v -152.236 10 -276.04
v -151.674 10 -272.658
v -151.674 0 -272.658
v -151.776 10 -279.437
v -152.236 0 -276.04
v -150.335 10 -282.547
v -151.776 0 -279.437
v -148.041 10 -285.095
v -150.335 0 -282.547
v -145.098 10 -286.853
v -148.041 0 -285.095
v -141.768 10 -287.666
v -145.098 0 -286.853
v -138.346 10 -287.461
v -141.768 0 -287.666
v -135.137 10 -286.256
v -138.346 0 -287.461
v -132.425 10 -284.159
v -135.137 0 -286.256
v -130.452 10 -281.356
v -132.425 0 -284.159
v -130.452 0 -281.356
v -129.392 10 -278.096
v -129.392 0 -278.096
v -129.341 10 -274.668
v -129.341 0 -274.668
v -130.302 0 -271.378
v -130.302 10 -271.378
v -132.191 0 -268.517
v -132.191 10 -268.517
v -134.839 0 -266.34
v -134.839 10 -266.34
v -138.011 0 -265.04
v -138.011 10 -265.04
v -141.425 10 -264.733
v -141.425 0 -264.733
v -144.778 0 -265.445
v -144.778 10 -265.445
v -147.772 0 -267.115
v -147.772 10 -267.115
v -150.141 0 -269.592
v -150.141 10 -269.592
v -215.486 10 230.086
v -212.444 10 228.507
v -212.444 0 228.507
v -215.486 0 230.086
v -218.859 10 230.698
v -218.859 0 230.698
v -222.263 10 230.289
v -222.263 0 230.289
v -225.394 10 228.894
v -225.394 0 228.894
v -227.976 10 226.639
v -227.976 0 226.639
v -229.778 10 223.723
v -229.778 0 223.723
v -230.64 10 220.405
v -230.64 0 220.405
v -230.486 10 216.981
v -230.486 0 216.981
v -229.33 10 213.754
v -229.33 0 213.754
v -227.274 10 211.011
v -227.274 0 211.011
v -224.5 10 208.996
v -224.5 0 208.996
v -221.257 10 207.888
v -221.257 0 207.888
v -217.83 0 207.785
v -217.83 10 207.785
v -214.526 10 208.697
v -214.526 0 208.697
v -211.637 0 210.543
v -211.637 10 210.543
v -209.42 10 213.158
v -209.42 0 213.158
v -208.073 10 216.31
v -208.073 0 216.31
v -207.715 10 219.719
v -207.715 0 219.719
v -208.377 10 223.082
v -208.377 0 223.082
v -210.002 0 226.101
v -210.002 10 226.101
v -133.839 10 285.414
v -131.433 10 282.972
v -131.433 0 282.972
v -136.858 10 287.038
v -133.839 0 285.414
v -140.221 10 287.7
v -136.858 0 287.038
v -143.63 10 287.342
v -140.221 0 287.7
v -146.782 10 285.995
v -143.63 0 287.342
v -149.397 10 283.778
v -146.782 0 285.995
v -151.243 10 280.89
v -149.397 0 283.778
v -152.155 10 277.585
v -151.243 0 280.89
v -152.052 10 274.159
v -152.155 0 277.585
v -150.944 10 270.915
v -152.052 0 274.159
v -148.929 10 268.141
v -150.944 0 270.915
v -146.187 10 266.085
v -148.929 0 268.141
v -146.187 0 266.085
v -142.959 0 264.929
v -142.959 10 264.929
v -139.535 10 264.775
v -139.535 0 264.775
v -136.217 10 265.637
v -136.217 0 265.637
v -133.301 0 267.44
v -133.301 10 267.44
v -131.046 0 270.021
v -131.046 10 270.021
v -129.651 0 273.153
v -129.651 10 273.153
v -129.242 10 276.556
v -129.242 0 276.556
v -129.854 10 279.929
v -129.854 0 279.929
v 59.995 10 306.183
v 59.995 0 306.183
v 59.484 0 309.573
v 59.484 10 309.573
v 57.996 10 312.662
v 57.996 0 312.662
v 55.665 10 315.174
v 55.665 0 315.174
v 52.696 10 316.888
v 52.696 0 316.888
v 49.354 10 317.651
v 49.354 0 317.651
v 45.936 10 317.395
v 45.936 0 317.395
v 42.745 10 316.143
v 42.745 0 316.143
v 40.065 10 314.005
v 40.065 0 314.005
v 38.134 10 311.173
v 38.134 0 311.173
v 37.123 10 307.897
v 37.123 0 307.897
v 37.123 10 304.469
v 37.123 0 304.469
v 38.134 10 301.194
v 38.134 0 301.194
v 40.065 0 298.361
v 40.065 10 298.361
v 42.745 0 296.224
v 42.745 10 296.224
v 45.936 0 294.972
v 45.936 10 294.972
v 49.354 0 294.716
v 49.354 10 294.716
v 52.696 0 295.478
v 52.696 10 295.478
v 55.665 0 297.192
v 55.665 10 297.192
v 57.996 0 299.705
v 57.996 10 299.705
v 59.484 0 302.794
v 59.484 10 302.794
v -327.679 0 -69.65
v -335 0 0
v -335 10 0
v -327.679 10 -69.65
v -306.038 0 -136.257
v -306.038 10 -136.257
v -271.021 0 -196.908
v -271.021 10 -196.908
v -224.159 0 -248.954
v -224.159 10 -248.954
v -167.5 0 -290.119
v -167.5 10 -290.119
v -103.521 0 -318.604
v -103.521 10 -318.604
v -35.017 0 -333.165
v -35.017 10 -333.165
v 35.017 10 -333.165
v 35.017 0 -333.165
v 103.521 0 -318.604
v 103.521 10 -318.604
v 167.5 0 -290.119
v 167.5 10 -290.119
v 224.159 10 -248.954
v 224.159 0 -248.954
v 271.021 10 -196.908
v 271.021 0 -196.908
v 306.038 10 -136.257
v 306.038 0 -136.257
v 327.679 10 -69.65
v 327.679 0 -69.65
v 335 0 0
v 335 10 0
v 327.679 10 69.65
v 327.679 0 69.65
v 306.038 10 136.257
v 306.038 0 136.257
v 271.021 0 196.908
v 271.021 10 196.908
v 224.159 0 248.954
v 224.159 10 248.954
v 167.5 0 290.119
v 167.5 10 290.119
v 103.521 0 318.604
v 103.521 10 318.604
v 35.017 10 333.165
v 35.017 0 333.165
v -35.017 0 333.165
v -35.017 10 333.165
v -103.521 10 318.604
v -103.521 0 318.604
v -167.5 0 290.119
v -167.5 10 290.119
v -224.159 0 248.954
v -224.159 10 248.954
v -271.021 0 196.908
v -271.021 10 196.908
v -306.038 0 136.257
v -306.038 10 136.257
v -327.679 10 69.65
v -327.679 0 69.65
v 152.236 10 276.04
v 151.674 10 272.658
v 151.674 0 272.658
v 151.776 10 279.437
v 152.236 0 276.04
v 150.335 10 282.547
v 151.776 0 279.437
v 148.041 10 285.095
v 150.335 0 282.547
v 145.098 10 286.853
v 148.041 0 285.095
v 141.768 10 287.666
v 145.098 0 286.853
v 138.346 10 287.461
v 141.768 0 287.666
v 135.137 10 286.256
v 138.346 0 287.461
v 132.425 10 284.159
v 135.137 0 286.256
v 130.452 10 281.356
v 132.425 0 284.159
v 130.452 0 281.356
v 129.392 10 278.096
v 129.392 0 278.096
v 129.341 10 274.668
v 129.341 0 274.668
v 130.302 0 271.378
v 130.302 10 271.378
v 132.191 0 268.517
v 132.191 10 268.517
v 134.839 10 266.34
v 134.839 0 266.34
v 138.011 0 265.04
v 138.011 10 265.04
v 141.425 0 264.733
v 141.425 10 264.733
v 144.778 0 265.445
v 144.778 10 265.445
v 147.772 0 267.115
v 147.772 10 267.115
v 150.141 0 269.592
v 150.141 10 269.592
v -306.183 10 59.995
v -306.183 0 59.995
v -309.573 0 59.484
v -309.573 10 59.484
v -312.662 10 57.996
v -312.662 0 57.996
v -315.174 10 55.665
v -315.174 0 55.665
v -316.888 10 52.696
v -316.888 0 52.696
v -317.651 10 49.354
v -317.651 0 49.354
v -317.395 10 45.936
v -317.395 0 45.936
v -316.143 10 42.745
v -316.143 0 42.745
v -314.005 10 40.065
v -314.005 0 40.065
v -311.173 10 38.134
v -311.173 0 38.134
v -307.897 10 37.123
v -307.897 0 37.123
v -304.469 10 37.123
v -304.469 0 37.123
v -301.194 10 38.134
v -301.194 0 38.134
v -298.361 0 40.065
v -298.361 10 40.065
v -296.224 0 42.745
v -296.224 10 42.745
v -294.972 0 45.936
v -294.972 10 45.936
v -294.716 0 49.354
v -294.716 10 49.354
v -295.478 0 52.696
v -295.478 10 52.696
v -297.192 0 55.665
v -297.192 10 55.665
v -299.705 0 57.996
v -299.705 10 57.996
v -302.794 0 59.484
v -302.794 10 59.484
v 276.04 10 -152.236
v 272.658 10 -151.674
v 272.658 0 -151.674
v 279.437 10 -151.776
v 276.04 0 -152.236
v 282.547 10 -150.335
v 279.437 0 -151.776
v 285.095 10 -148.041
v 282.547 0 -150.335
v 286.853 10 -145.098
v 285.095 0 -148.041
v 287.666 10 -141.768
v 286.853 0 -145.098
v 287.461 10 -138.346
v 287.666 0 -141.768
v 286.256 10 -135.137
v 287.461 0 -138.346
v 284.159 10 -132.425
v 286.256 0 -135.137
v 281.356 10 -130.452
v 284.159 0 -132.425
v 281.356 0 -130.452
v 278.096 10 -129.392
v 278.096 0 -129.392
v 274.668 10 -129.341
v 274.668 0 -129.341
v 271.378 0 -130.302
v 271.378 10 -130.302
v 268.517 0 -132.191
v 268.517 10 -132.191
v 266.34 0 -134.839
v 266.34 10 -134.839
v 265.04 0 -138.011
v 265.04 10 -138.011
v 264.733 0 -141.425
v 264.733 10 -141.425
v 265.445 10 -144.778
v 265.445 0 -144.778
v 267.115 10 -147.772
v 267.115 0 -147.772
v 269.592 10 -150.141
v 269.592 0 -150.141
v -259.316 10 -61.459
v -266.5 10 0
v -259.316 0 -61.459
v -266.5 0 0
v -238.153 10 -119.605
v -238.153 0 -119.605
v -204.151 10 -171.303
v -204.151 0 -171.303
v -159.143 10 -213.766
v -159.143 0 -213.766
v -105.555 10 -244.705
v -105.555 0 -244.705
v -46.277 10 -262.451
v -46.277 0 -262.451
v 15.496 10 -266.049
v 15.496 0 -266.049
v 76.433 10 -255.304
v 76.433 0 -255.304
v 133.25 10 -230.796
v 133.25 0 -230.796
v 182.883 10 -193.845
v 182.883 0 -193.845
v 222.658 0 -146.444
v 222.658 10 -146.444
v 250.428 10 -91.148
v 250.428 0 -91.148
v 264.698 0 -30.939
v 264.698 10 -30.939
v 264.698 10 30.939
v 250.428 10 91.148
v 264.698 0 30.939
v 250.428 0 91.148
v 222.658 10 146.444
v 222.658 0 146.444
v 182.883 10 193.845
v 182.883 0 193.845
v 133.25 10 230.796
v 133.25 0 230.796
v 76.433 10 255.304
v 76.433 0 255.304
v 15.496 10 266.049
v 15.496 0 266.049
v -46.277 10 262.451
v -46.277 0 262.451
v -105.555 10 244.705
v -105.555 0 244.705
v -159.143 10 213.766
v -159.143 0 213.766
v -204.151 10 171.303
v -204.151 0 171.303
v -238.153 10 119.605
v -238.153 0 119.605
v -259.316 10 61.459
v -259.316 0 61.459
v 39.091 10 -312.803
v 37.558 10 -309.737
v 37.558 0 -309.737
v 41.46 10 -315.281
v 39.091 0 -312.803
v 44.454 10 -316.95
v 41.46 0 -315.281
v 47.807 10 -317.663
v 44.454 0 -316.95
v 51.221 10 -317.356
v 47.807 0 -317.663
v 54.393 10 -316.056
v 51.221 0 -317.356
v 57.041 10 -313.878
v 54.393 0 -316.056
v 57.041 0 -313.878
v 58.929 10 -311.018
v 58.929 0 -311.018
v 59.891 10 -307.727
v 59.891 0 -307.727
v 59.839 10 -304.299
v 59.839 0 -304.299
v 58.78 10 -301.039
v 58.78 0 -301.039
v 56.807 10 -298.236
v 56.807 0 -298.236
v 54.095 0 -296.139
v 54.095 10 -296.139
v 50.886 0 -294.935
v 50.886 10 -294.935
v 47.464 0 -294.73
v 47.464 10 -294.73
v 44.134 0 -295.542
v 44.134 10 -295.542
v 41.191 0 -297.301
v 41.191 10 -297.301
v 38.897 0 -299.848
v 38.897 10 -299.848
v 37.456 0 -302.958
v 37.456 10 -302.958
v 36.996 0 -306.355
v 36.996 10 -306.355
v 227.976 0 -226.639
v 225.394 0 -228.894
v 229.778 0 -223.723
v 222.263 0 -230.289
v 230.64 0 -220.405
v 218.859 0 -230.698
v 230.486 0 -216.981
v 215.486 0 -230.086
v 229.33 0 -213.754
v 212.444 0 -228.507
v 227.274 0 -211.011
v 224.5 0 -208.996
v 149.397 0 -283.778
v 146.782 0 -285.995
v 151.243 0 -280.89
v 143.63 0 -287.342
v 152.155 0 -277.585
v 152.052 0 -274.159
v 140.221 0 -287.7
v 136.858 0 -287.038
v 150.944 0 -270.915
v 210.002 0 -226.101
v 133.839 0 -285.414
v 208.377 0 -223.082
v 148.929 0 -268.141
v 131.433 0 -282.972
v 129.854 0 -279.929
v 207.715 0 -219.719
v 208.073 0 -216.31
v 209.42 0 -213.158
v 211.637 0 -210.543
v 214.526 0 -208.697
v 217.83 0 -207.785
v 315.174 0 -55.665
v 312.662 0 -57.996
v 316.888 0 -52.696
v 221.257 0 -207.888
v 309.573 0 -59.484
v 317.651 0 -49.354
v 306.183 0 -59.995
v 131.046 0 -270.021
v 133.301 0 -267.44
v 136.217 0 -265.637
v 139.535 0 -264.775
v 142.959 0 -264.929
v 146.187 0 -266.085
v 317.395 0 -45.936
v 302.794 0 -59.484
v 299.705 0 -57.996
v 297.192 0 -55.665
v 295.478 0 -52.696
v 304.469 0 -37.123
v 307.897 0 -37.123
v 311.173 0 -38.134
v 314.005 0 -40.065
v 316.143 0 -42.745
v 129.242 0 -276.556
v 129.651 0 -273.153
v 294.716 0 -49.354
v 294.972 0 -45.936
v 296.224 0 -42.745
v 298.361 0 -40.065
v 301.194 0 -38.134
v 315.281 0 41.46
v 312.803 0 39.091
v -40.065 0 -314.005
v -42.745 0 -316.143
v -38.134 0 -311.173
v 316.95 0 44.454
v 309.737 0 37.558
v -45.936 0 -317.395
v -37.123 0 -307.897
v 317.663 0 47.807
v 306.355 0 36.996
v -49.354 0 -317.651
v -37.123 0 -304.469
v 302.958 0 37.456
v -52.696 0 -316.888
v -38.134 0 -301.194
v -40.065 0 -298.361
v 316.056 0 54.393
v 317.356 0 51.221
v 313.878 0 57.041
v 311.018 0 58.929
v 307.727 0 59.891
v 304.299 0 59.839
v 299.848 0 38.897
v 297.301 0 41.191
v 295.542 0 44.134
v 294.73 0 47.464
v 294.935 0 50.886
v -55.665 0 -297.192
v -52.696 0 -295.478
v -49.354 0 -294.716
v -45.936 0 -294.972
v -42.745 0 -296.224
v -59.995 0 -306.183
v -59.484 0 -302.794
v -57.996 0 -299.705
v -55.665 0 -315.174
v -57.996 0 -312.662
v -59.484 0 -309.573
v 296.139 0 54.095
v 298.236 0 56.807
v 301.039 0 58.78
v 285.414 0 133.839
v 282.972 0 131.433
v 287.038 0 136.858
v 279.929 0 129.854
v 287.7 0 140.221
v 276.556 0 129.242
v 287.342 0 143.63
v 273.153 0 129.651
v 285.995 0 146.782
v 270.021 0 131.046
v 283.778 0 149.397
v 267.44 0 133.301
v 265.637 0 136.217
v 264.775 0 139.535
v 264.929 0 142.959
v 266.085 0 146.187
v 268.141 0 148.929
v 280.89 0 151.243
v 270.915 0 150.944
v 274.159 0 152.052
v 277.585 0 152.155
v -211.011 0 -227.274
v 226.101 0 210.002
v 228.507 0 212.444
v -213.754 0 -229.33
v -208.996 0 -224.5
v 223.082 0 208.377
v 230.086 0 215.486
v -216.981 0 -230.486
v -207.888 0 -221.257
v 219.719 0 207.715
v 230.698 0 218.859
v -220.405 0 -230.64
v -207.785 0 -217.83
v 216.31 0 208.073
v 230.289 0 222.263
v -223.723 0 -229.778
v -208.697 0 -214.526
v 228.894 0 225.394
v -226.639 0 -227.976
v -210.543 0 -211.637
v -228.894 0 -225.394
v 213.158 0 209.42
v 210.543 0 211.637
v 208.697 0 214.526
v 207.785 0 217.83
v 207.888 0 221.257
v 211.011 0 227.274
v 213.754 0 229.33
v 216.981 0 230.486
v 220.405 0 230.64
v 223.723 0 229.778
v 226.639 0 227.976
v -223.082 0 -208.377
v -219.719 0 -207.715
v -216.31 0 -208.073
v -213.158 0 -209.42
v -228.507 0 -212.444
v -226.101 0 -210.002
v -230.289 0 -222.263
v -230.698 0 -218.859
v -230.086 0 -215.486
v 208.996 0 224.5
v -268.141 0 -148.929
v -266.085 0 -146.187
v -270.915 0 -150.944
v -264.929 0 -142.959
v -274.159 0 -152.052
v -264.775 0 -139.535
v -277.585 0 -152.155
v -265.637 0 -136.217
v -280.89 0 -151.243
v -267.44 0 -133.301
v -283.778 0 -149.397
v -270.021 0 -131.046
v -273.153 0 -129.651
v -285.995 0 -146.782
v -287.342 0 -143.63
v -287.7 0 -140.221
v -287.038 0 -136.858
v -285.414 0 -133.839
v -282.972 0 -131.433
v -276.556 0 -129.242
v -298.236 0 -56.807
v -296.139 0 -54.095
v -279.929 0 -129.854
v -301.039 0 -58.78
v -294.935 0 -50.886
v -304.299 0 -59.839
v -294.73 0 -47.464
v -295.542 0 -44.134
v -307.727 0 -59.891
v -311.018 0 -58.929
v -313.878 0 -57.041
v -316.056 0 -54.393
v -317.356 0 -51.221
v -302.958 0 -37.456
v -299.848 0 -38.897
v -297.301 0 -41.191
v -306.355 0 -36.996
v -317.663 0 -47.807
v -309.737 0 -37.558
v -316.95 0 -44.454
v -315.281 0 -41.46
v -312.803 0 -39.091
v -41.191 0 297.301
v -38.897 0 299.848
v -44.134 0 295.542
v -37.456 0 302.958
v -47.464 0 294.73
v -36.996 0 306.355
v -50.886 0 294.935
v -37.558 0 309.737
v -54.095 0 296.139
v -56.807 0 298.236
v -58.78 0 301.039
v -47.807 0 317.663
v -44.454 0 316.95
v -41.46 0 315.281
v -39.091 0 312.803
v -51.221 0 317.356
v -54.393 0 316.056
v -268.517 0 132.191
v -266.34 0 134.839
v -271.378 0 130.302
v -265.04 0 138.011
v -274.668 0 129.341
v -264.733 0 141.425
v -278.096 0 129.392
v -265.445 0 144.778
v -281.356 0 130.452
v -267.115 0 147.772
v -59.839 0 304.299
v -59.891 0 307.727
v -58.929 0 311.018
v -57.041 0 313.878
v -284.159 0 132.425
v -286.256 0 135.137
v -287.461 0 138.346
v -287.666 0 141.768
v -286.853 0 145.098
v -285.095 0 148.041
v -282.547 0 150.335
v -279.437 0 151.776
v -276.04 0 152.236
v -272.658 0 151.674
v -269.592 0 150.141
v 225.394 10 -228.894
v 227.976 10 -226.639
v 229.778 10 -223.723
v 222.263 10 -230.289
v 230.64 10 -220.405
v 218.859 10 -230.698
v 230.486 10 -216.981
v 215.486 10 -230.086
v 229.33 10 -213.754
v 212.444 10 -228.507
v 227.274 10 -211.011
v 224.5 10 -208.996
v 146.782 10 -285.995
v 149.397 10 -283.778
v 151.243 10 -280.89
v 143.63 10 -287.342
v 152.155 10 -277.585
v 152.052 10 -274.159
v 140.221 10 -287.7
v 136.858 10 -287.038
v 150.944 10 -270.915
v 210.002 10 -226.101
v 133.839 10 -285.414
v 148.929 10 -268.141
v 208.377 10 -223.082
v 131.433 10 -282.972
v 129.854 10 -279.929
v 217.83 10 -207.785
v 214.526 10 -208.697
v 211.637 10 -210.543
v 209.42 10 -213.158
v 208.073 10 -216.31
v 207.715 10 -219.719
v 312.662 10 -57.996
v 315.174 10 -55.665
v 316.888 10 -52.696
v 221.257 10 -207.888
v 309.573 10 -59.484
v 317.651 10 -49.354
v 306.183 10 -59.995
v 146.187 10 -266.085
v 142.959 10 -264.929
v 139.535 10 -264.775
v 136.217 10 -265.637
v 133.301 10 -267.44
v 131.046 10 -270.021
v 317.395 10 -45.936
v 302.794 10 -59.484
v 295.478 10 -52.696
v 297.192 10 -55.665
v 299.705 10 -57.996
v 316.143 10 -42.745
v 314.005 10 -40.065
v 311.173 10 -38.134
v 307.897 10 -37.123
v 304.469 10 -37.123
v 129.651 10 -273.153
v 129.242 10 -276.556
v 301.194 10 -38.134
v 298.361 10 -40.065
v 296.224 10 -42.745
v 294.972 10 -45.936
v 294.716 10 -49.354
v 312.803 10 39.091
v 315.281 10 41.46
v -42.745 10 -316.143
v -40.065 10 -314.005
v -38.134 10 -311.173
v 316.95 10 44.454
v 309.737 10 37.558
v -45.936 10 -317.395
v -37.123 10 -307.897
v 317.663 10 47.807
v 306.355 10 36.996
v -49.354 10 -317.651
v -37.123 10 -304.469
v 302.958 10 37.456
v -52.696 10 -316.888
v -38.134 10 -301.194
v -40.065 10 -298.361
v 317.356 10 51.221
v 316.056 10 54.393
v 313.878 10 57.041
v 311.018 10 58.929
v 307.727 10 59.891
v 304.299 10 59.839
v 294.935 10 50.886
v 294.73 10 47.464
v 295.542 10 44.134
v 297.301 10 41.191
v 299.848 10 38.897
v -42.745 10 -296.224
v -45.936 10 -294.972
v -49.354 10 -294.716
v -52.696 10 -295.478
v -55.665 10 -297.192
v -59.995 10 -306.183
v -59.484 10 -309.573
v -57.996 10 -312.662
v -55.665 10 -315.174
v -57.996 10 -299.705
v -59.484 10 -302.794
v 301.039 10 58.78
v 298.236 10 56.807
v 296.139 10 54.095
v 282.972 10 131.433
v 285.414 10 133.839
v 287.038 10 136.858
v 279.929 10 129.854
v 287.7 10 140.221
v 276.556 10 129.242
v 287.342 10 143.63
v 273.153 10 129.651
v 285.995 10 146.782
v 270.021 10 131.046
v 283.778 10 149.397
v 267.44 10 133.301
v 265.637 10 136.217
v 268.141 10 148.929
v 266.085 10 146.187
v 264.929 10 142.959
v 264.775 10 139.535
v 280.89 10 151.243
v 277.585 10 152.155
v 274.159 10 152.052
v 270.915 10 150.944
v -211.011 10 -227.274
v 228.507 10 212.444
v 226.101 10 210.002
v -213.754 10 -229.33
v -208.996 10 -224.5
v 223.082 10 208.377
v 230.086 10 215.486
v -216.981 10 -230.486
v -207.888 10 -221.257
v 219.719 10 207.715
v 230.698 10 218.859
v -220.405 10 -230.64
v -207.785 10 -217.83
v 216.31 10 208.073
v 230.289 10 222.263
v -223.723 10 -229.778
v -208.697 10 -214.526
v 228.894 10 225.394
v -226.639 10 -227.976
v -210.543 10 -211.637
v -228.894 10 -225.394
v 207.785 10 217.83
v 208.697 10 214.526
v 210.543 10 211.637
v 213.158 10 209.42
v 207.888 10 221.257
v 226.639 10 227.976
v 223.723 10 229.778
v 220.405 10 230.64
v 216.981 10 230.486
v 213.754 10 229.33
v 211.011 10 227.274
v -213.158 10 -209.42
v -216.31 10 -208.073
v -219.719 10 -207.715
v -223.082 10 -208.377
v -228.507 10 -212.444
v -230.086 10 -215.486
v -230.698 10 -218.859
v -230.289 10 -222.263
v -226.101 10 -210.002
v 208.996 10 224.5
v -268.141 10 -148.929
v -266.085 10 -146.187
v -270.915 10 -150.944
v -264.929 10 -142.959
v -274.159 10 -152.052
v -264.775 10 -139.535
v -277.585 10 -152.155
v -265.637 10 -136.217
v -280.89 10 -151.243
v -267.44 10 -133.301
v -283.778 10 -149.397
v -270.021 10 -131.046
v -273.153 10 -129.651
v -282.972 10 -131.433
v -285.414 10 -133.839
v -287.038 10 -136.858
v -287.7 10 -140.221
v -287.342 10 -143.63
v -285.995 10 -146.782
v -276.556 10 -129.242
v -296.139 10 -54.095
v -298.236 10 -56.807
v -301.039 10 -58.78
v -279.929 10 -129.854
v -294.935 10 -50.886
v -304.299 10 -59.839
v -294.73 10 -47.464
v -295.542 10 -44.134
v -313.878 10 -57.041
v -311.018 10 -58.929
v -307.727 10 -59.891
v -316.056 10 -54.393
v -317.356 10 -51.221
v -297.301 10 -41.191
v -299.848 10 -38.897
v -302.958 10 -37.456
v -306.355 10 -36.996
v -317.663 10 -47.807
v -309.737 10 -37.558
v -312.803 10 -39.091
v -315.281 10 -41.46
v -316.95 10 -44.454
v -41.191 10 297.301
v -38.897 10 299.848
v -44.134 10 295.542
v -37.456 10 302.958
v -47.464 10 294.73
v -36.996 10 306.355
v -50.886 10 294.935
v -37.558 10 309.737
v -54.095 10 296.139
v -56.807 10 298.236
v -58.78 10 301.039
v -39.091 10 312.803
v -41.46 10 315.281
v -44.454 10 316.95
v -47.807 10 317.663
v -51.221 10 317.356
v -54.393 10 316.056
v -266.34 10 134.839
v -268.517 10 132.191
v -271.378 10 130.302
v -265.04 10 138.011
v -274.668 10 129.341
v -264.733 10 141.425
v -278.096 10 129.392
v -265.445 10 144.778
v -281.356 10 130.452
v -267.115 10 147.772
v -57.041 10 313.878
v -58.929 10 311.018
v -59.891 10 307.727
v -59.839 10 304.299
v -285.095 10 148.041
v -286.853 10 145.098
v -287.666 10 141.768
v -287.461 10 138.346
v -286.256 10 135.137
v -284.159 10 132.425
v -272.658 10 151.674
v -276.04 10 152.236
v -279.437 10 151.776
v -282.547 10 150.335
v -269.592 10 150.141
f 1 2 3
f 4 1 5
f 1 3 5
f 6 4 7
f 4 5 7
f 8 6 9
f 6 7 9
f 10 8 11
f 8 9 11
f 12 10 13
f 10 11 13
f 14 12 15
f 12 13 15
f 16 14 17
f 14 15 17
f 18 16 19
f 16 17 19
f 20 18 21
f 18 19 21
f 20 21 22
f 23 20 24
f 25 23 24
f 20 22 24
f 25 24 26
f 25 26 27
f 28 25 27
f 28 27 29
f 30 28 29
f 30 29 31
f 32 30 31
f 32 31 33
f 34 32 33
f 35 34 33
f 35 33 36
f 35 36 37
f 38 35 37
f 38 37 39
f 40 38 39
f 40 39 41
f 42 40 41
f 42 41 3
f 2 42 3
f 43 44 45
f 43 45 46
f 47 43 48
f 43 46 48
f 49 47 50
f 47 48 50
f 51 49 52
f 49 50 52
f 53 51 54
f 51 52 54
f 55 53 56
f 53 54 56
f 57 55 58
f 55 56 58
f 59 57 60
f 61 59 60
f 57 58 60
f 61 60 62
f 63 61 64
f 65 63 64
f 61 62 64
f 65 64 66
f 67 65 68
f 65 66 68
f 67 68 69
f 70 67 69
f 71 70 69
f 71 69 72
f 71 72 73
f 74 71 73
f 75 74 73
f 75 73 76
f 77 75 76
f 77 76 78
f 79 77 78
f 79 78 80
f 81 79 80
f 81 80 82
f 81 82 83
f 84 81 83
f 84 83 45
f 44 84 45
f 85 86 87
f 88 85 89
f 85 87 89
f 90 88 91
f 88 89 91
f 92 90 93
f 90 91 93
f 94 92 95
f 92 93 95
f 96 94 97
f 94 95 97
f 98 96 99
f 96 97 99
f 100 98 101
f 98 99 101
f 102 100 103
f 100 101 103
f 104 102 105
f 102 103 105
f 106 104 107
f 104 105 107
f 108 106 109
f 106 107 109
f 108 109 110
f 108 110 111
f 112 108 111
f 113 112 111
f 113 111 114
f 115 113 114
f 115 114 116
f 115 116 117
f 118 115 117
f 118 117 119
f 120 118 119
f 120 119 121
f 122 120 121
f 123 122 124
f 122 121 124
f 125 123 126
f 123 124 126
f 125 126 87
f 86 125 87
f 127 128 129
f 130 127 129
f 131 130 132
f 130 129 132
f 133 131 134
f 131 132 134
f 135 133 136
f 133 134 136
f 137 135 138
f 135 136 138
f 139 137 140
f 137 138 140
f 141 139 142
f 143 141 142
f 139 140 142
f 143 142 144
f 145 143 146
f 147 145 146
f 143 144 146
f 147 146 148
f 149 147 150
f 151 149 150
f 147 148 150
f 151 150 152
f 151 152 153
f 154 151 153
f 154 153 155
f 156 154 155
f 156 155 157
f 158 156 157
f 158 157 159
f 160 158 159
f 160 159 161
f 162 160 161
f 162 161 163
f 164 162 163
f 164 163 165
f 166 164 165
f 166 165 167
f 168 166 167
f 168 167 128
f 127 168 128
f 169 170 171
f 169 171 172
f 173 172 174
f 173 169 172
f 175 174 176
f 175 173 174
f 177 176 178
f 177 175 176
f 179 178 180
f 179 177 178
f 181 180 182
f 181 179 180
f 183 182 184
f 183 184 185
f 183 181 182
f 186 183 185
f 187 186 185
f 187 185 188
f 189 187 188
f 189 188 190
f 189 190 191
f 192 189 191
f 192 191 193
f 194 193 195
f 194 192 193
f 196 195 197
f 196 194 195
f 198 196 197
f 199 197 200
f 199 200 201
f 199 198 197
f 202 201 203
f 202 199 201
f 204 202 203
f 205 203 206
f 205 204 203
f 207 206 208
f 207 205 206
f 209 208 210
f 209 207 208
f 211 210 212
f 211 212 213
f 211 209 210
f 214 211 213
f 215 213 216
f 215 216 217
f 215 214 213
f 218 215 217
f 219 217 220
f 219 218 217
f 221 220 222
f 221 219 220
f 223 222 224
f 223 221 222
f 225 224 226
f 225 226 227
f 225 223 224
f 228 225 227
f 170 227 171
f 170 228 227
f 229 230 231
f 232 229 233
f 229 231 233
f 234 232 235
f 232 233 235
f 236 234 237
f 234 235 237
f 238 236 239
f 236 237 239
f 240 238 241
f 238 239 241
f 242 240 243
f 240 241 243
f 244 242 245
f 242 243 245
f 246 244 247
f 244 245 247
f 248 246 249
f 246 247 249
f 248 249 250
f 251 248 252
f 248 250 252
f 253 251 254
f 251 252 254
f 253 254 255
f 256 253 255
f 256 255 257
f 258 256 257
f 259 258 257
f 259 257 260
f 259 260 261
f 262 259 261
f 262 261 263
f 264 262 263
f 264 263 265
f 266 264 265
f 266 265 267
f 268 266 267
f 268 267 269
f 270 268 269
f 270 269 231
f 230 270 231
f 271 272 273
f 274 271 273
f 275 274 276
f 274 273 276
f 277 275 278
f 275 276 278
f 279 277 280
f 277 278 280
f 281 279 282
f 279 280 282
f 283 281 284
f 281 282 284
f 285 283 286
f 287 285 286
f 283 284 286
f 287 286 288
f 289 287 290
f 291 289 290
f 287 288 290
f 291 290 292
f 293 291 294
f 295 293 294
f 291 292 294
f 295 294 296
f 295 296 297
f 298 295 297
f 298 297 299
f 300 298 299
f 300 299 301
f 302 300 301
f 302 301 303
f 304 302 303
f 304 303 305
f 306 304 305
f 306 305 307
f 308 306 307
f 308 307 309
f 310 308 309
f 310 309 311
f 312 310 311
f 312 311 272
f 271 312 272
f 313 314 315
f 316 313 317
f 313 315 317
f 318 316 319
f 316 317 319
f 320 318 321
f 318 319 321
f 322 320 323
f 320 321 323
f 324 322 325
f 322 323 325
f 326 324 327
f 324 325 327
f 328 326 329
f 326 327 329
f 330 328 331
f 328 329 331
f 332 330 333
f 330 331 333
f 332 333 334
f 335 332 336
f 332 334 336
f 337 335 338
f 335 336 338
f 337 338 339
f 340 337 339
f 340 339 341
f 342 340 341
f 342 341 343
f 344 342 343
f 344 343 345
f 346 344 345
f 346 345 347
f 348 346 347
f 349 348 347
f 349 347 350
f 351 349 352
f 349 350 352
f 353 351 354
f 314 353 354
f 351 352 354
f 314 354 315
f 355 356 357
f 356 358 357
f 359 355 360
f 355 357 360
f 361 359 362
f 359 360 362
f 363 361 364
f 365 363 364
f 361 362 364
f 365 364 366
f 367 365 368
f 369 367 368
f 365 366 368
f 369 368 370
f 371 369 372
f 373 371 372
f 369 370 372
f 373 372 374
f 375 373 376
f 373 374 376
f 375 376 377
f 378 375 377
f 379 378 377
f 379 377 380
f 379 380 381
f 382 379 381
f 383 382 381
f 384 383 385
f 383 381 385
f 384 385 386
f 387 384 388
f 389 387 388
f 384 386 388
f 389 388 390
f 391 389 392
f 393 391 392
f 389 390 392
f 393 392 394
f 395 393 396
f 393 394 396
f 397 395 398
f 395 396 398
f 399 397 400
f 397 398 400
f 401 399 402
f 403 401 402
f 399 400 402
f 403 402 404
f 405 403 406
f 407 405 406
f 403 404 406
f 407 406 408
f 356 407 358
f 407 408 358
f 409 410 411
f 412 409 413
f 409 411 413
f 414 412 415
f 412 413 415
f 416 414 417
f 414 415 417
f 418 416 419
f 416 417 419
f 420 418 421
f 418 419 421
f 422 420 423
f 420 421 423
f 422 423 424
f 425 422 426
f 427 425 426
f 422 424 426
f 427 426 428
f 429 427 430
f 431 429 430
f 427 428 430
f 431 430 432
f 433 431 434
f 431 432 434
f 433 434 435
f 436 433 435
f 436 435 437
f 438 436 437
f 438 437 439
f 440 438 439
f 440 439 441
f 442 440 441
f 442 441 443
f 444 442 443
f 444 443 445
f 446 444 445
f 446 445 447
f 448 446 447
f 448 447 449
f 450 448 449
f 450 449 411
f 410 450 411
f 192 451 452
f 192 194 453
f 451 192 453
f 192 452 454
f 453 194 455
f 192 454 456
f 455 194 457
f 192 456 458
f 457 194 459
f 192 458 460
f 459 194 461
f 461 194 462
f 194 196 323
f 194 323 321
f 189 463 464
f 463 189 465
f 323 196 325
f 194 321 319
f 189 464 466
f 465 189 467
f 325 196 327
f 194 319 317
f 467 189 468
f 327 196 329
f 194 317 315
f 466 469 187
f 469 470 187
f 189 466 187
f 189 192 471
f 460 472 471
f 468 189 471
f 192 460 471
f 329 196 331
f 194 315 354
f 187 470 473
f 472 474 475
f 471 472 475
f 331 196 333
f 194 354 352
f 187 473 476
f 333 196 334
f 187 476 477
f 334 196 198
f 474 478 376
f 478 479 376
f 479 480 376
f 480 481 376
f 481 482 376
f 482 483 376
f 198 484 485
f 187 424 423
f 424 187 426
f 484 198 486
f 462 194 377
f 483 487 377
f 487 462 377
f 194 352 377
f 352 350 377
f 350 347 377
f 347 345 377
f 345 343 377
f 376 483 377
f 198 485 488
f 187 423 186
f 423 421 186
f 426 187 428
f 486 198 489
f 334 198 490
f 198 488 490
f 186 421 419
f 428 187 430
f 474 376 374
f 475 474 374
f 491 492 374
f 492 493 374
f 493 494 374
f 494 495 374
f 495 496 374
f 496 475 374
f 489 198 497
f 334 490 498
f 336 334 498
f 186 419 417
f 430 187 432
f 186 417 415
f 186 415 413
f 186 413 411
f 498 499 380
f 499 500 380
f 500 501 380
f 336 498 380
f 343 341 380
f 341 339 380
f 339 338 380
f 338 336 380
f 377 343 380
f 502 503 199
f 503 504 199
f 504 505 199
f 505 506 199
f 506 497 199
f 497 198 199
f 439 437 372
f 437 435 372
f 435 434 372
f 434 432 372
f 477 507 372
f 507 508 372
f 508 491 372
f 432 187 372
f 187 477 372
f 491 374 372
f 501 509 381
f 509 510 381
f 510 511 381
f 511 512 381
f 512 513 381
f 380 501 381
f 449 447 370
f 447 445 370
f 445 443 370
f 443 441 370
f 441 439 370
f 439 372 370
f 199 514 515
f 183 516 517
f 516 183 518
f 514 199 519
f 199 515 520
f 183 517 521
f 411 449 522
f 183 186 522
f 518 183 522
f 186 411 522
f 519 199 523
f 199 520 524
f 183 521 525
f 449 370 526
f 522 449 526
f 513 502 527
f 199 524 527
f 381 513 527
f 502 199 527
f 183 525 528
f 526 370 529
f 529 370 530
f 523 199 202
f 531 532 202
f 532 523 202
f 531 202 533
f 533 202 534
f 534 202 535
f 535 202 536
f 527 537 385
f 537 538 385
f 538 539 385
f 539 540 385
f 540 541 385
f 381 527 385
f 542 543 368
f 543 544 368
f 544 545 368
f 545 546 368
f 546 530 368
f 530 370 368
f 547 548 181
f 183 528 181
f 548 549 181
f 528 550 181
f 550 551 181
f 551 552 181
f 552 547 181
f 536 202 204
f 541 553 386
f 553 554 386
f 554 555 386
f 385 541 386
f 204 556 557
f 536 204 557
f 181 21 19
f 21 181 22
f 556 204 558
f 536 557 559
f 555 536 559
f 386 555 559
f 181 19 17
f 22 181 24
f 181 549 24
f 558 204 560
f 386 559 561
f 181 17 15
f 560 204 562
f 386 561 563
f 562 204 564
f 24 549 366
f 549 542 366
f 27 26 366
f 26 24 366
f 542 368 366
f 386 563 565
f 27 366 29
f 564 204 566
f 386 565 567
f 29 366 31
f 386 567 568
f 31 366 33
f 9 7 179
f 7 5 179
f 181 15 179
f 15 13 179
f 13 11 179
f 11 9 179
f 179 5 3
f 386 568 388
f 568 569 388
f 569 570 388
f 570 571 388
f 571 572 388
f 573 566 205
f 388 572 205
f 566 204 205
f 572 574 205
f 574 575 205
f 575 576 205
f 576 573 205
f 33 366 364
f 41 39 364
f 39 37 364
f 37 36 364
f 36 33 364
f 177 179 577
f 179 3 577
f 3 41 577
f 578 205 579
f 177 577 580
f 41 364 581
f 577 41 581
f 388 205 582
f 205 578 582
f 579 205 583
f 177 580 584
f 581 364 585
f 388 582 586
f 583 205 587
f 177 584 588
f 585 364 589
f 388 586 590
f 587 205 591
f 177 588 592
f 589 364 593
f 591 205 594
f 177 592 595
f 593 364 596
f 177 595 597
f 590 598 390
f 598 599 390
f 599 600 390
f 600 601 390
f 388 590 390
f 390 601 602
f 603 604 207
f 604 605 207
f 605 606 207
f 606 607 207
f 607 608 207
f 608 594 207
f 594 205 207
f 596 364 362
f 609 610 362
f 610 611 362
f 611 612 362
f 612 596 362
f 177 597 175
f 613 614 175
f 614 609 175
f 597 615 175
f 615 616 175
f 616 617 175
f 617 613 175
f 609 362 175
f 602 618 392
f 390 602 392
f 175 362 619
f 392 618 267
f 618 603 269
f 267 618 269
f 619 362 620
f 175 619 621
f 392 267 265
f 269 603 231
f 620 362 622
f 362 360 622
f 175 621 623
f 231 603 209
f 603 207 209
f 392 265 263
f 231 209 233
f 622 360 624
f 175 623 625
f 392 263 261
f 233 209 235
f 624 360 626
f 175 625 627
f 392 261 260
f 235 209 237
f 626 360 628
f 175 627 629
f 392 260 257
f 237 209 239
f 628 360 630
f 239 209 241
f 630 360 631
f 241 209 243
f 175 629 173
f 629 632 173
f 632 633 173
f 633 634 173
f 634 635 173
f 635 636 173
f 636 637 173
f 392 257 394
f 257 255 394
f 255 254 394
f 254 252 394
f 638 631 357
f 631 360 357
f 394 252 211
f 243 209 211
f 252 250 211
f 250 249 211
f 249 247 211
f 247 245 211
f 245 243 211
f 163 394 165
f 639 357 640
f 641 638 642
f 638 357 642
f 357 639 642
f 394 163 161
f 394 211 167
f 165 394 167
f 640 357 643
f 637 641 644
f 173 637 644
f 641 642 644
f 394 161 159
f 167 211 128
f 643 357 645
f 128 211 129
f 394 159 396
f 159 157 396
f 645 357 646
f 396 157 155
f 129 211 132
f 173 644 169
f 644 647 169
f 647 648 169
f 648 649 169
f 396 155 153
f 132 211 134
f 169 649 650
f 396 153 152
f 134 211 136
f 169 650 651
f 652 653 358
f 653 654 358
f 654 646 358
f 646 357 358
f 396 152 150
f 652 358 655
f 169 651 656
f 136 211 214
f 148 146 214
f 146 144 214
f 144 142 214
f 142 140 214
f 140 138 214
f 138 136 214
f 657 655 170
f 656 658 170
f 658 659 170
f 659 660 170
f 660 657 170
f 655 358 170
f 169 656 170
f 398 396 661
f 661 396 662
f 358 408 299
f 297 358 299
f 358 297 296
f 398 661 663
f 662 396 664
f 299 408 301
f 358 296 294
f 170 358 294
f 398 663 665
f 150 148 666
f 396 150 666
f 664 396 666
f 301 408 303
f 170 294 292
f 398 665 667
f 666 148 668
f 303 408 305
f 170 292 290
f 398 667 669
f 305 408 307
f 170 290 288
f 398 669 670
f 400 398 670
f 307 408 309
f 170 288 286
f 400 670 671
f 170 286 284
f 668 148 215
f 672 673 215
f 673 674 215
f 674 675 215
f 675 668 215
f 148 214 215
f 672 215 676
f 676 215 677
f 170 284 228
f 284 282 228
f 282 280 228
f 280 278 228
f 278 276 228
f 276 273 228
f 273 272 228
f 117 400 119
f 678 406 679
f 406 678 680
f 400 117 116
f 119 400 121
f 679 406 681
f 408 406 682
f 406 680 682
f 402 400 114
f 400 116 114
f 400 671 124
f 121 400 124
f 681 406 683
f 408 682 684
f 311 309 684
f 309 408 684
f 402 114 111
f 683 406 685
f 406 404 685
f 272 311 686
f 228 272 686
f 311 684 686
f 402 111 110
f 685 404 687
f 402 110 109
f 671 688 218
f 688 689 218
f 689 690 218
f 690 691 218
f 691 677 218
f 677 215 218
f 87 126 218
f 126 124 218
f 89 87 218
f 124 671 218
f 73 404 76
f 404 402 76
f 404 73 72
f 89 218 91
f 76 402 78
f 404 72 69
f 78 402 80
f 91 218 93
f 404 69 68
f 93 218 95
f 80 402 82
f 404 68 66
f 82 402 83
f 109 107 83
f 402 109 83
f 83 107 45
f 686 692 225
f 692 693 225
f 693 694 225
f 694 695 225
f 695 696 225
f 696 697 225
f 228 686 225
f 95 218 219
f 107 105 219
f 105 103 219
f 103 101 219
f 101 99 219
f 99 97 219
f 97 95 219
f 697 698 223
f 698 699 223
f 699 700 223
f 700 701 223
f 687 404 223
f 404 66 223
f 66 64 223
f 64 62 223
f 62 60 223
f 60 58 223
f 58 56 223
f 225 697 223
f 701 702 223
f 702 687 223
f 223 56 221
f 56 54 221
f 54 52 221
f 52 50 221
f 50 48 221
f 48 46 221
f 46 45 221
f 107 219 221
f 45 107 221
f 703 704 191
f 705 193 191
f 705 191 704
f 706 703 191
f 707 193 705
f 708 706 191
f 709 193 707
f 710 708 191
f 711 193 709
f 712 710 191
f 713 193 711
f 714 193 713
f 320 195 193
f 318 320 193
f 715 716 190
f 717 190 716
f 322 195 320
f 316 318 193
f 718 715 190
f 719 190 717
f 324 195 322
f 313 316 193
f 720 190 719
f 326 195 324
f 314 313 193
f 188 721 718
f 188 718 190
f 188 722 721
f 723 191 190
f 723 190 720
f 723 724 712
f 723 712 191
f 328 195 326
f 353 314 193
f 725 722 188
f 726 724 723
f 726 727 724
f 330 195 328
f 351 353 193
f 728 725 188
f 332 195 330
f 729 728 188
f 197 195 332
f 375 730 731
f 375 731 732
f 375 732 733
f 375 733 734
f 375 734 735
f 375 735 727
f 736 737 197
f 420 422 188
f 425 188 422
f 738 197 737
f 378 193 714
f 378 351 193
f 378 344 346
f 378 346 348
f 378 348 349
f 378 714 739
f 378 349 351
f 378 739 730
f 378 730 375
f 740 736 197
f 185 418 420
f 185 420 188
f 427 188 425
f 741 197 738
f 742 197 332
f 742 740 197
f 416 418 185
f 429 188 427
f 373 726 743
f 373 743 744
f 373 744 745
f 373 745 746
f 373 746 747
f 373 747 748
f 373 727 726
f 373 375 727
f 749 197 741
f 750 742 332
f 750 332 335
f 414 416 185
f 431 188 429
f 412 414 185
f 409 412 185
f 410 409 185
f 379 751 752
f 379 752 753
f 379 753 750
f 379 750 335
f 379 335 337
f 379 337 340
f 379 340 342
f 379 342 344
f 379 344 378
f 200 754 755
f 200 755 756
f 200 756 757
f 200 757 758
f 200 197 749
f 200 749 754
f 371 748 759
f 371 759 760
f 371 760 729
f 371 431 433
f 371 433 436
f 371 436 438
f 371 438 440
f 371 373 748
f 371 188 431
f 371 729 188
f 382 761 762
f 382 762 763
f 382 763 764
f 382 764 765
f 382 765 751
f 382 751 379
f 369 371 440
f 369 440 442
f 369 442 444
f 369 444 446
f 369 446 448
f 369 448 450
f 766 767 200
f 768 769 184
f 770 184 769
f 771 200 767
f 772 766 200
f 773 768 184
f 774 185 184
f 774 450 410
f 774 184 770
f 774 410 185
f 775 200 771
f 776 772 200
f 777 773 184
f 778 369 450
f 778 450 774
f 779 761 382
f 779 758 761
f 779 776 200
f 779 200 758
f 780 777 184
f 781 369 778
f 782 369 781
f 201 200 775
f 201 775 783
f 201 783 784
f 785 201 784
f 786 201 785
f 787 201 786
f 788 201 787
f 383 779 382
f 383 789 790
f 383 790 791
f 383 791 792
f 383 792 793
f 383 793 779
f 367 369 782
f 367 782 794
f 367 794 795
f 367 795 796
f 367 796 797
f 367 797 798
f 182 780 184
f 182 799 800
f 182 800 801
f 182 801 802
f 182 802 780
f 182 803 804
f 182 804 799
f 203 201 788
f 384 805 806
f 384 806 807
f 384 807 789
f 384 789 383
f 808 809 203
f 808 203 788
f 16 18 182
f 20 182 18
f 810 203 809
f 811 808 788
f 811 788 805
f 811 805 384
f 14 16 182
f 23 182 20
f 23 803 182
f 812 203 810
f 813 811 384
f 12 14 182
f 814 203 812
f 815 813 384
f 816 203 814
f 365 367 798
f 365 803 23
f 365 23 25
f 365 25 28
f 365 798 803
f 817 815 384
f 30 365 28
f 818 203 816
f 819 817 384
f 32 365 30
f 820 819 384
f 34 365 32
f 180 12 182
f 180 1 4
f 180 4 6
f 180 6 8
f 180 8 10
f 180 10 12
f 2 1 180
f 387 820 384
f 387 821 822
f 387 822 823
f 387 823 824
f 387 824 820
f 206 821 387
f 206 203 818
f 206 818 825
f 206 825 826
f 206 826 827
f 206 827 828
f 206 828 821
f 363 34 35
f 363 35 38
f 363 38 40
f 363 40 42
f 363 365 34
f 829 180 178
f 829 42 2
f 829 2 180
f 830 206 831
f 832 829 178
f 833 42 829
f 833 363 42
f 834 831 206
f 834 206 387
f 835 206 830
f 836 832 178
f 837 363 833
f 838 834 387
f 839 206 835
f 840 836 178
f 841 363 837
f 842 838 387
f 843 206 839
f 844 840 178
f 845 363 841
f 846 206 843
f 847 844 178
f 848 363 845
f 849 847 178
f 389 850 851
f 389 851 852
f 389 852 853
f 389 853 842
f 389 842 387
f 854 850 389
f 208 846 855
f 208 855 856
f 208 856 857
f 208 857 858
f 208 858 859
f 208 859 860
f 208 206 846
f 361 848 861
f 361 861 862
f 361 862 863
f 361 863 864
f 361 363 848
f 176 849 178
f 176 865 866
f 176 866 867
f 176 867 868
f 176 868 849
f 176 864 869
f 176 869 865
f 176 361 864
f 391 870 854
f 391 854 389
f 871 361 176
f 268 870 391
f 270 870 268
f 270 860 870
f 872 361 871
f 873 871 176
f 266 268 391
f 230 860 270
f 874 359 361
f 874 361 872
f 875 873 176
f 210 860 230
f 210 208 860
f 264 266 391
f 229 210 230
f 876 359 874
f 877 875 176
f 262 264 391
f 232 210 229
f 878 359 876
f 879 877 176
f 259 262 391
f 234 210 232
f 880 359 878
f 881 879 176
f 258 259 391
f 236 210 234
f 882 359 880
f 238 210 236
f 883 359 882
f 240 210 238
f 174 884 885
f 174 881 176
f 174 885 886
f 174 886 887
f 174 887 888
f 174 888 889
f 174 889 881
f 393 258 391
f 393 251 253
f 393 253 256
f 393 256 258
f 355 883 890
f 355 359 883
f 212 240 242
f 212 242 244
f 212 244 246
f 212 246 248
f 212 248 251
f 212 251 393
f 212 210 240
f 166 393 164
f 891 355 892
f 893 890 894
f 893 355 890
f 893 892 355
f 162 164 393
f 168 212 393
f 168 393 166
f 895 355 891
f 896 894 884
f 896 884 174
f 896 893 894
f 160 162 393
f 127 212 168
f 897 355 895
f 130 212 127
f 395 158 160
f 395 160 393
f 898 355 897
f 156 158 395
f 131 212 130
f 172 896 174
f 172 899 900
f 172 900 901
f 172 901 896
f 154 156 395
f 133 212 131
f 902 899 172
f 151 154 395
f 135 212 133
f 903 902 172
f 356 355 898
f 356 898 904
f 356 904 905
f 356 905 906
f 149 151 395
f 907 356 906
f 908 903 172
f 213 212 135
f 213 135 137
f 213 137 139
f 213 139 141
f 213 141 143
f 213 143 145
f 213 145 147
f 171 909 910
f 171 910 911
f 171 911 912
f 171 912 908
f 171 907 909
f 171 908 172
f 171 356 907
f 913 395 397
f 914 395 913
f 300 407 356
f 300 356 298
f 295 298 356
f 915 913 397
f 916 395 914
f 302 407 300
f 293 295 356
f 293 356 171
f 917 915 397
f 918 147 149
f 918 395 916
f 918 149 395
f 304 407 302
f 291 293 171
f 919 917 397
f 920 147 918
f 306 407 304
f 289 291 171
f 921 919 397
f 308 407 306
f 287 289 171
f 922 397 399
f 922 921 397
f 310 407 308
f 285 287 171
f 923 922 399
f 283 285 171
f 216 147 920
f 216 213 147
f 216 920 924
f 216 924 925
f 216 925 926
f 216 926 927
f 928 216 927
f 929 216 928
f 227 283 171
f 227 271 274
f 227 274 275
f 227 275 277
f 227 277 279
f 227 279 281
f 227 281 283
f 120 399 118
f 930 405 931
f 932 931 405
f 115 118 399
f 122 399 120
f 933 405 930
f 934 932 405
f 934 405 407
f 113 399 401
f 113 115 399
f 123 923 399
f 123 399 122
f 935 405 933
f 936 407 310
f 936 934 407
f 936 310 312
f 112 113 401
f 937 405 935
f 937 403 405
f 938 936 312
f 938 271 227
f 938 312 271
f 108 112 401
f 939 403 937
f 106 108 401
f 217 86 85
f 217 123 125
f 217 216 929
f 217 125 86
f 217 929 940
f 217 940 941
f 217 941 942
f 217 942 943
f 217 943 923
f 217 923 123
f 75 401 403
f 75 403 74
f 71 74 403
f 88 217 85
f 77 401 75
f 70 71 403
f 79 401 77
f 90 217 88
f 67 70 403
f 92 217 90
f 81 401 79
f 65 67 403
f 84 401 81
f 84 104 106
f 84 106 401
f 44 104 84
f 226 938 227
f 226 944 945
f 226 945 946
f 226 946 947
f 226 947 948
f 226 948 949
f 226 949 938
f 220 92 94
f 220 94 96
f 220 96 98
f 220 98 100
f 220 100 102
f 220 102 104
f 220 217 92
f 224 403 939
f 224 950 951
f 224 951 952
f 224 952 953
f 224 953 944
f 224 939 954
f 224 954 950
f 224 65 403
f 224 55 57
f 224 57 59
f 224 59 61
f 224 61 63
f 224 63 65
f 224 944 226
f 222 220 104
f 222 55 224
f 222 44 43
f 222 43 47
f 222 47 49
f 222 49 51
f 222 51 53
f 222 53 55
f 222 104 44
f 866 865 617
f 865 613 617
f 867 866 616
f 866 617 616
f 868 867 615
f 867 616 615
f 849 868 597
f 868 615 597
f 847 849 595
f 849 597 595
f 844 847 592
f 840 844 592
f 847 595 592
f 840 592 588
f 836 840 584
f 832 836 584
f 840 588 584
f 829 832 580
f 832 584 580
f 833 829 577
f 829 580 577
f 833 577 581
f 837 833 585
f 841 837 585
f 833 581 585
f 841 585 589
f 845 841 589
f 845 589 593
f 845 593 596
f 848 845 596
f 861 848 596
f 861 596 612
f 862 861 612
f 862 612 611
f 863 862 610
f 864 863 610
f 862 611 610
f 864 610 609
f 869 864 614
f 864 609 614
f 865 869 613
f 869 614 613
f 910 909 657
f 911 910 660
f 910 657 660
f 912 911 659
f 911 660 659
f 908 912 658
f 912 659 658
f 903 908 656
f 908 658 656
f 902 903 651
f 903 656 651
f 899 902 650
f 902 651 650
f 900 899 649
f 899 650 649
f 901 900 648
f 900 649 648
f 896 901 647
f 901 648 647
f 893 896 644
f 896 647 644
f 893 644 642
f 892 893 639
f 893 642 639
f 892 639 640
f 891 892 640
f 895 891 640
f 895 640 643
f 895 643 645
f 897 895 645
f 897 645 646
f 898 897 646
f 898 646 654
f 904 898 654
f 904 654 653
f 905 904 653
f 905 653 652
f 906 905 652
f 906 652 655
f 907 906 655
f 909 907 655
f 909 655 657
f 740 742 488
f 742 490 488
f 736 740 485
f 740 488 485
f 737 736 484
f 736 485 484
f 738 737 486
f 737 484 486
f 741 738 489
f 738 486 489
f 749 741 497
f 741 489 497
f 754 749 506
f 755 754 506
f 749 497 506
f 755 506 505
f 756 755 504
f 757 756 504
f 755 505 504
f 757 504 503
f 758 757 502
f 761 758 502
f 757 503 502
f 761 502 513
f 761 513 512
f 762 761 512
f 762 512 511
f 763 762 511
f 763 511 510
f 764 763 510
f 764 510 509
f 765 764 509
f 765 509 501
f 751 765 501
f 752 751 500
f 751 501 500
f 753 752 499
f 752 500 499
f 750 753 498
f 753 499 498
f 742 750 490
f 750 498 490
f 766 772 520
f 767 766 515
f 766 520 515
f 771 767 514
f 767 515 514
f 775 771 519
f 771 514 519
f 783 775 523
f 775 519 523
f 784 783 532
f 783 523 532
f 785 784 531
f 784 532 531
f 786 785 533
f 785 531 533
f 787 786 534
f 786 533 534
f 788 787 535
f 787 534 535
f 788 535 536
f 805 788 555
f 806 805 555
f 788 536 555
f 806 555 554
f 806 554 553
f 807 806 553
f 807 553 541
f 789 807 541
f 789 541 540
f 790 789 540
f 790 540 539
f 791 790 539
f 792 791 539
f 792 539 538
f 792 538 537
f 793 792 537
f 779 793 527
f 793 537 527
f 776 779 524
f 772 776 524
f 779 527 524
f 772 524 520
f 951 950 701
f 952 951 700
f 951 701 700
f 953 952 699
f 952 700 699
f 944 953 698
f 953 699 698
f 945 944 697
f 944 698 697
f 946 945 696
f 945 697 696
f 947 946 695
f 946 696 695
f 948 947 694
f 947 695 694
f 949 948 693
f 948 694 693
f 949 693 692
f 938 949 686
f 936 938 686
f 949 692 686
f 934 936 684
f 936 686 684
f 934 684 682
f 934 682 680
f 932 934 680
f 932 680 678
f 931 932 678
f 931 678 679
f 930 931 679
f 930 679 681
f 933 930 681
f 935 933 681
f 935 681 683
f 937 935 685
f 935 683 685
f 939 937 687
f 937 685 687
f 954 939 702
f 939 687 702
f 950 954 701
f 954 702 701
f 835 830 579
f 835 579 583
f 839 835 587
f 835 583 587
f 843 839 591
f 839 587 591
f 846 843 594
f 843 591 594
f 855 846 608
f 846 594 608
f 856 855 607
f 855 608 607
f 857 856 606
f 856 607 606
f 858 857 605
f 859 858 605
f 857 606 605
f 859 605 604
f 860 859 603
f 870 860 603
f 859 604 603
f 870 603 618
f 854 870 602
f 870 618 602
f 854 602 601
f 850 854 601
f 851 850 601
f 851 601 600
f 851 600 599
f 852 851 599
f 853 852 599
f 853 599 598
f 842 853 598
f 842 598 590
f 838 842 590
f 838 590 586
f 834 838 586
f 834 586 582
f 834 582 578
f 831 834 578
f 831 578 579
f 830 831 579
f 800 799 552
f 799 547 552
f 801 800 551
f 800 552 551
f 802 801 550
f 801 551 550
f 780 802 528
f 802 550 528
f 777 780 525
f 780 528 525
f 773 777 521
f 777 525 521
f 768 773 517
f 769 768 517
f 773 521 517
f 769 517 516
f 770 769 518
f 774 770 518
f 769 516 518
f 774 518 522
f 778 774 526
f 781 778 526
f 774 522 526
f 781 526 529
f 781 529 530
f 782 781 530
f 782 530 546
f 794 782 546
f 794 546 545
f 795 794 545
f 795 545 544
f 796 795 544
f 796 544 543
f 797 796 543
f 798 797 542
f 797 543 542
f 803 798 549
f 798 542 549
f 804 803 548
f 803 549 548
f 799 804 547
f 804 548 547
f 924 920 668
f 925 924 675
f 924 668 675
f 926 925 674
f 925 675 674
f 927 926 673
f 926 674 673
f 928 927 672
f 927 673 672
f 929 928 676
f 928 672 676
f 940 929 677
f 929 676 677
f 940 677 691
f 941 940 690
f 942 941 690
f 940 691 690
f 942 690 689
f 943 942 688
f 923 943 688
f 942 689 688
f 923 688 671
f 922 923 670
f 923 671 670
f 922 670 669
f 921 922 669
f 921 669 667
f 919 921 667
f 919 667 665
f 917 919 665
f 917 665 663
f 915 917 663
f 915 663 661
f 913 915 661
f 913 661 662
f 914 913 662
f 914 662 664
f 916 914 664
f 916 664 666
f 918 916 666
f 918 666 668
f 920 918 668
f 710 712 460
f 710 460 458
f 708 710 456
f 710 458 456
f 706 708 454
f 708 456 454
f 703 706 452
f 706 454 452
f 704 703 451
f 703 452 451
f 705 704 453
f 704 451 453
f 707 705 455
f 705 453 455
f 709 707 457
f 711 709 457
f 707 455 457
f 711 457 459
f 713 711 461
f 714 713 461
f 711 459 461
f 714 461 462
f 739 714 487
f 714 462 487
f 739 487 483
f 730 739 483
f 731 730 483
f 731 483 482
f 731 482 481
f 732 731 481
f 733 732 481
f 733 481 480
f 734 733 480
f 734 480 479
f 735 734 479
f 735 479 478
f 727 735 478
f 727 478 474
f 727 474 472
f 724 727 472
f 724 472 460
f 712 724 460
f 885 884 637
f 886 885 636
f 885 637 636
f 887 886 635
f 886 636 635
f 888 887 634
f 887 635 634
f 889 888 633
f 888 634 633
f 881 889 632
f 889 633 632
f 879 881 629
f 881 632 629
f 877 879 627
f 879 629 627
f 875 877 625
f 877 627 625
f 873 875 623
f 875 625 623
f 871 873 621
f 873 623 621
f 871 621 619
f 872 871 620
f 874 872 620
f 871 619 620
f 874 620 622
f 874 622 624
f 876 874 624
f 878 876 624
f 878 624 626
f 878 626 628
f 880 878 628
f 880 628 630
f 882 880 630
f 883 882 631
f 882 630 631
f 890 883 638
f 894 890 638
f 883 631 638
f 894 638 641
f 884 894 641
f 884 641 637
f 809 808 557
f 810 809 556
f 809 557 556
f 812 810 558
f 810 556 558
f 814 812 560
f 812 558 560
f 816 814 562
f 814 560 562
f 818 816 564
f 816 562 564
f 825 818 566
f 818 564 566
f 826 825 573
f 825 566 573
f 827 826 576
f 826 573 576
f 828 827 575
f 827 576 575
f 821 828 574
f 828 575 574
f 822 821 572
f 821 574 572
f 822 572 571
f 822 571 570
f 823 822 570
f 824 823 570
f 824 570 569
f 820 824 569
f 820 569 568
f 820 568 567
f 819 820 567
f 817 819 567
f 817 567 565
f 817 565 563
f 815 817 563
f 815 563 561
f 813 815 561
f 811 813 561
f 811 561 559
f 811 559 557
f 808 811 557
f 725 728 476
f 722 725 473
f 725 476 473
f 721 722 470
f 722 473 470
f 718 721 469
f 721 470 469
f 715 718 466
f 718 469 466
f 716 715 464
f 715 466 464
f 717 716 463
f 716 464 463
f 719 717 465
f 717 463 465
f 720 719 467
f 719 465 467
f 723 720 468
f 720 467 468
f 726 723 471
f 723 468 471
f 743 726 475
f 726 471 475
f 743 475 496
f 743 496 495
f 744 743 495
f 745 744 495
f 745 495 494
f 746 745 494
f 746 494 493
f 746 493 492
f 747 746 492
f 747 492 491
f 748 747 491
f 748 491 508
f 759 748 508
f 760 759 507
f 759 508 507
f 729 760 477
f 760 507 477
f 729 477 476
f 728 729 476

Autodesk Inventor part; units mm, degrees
ref_plane "YZ Plane" through (0, 0, 0) normal (1, 0, 0) x (0, 1, 0)
ref_plane "XZ Plane" through (0, 0, 0) normal (0, 1, 0) x (-1, 0, 0)
ref_plane "XY Plane" through (0, 0, 0) normal (0, 0, 1) x (1, 0, 0)
sketch "Sketch1" plane through (0, 0, 0) normal (0, 1, 0) x (-1, 0, 0)
  circle A0 centre (0, 0) radius 266.5
  circle A1 centre (0, 0) radius 335
  line L0 (335, 0) -> (266.5, 0)
  line L1 (-266.5, 0) -> (-335, 0)
  line L2 (0, 266.5) -> (0, 335)
  point P0 (300.75, 0)
  point P1 (-300.75, 0)
  point P2 (0, 300.75)
  dimension "d1" = 670
  dimension "d4" = 533
extrude "Extrusion1" add sketch "Sketch1" along normal blind 10 contours L0 A1 L1 A0 | A0 L2 A1 L0 | A0 L1 A1 L2
sketch "Sketch2" plane through (0, 0, 0) normal (0, -1, 0) x (1, 0, 0)
  circle A0 centre (0, 0) radius 335 projected
  circle A1 centre (0, 0) radius 266.5 projected
  circle A2 centre (48.4947, 306.1834) radius 11.5
  circle A3 centre (0, 0) radius 266.5 projected
  line L0 (48.4947, 306.1834) -> (0, 0)
  point P0 (0, 266.5)
  point P1 (265, 0)
  dimension "d5" = 310
  dimension "d7" = 23
extrude "Cut1" cut sketch "Sketch2" against normal blind 10 contours A2
pattern_circular "Circular Pattern1" count 20 over 360 about axis through (0, 0, 0) along (0, 1, 0) of "Cut1"
equation "\"d2\" = Thickness"
equation "\"d9\" = Thickness"
equation "\"BendReliefDepth\" = 0.5 * Thickness"
equation "\"Thickness\" = 10"
properties part number "PNS-612 accses hatch flangeipt_1200"
